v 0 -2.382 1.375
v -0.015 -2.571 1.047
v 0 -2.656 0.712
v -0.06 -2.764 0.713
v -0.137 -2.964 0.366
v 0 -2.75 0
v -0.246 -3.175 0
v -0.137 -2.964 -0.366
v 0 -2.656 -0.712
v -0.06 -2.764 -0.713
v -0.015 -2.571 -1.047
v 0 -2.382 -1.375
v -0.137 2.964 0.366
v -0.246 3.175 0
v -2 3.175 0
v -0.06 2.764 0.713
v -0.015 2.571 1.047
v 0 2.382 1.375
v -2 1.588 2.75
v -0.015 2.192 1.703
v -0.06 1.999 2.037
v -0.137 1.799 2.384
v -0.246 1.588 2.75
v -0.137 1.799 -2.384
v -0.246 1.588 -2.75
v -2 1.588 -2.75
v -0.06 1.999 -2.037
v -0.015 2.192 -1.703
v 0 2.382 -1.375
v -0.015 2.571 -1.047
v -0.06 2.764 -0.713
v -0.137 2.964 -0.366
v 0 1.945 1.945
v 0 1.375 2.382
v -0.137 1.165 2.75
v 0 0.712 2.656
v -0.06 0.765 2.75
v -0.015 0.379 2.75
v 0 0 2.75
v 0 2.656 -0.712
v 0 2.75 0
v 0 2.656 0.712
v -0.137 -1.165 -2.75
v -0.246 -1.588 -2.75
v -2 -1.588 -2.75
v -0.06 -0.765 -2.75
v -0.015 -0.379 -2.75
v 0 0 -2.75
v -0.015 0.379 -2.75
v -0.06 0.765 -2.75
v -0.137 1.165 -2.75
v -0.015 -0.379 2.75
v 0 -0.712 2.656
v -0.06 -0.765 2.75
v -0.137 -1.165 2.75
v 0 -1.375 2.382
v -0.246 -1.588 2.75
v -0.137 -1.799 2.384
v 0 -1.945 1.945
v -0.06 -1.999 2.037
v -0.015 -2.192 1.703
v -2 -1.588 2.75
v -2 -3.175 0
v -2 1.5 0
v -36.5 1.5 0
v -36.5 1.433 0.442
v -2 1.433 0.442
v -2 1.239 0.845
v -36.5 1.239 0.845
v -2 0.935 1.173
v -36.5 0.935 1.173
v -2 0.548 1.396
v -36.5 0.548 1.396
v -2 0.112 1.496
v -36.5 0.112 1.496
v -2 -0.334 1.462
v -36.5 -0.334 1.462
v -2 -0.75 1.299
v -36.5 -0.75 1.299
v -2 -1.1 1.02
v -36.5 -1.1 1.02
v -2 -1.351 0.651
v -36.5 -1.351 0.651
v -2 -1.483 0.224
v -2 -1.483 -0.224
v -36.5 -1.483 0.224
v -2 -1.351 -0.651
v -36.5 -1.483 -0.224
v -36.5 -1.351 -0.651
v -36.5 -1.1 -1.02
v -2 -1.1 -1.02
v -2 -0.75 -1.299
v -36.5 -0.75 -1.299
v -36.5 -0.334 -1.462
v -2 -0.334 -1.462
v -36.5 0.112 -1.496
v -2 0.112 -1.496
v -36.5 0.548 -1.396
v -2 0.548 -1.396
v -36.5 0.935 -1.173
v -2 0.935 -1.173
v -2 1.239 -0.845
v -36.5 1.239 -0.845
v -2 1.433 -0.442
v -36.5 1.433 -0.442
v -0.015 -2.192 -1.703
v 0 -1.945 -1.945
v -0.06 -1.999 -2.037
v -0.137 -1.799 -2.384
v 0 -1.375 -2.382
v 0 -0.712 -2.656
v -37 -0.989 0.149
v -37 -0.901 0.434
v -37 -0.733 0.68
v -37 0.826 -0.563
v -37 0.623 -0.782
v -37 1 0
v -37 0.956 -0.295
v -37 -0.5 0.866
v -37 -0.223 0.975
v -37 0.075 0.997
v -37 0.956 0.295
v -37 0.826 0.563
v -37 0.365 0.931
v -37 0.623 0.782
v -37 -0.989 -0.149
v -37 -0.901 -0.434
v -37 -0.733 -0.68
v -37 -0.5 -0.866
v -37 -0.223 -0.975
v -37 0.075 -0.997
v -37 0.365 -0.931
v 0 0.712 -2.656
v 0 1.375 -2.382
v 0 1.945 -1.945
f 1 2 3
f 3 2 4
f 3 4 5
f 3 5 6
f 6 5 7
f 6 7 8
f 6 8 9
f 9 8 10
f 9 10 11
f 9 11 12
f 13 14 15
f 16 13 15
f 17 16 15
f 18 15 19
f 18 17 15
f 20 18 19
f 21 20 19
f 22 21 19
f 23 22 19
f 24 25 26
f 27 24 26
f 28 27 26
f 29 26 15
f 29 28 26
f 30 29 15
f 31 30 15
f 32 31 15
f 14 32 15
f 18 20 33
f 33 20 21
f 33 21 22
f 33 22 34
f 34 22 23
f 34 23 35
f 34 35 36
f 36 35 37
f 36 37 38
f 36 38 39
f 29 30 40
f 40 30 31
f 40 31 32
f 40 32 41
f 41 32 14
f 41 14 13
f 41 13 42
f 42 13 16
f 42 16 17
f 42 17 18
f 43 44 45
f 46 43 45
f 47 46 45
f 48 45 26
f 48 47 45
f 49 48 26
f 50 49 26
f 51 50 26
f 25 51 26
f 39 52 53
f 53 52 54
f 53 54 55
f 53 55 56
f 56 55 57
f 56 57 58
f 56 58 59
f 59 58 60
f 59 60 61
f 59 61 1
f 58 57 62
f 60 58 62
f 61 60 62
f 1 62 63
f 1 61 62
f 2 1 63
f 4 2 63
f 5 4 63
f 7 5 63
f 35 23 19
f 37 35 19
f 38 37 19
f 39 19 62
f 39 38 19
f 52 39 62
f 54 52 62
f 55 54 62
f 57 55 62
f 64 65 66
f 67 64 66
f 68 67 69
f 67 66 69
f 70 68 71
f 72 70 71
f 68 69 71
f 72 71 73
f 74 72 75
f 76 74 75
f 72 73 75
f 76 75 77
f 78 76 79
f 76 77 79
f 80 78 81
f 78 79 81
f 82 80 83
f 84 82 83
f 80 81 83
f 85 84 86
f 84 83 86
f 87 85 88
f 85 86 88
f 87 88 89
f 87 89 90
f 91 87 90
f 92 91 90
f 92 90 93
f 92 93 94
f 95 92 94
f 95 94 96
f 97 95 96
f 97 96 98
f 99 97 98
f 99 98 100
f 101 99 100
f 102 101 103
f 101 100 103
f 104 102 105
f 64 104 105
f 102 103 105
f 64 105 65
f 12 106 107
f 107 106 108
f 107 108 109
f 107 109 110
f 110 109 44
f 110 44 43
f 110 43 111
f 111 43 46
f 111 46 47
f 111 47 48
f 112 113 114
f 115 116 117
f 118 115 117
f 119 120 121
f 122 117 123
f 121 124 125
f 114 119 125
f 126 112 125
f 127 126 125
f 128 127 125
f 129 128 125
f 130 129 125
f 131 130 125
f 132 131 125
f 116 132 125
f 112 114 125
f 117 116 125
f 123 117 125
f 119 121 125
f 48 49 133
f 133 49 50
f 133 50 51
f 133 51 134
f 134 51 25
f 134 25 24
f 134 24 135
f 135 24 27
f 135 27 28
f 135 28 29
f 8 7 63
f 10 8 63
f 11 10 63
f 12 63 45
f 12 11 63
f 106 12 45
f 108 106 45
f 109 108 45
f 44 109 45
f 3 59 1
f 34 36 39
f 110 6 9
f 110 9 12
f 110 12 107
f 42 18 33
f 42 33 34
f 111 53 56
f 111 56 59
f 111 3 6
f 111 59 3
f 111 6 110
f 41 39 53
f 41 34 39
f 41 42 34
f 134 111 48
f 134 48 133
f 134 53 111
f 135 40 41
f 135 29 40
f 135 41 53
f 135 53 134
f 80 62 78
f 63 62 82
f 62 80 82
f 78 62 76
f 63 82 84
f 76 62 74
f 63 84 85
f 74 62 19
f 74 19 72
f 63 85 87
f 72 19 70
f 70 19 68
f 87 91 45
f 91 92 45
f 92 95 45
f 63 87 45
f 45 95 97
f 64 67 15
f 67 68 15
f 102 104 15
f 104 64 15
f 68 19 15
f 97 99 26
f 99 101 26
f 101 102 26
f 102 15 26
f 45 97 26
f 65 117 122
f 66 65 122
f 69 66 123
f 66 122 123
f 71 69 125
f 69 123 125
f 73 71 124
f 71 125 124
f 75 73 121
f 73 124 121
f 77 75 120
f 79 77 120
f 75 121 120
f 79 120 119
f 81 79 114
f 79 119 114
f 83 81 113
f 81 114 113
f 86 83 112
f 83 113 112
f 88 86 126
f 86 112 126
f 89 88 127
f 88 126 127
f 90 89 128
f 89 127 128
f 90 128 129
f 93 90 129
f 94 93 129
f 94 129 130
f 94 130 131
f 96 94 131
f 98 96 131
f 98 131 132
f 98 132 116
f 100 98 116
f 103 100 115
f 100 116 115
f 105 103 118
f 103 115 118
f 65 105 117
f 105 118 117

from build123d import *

# Parameters (mm, degrees)
DODANIE_WYCI_GNI_CIE1_DEPTH = 2
SFAZOWANIE1_SIZE            = 0.5


with BuildPart() as part:
    # Szkic1 → Obrót1 (revolve)
    with BuildSketch(Plane.XY):
        Polygon((0, 0), (0, 2.75), (-2, 2.75), (-2, 1.5), (-37, 1.5), (-37, 0), align=None)
    revolve(axis=Axis((-37, 0, 0), (1, 0, 0)))

    # Szkic2 → Dodanie-wyciągnięcie1 (add)
    with BuildSketch(Plane(origin=(0, 0, 0), x_dir=(0, 0, -1), z_dir=(1, 0, 0))):
        Polygon((-2.75, 1.58771324), (-2.75, -1.58771324), (0, -3.175426481), (2.75, -1.58771324), (2.75, 1.58771324), (0, 3.175426481), align=None)
    extrude(amount=-DODANIE_WYCI_GNI_CIE1_DEPTH)

    # Sfazowanie1
    sfazowanie1_edges = [part.edges().sort_by_distance(p)[0] for p in [
        (-37, -1.5, 0),
    ]]
    chamfer(sfazowanie1_edges, length=SFAZOWANIE1_SIZE)

    # Szkic9 → Wycięcie-obrót1 (revolve, cut)
    with BuildSketch(Plane.XY):
        Polygon((0, 3.175426481), (0, 2.75), (-0.245620093, 3.175426481), align=None)
    revolve(axis=Axis((-37, 0, 0), (1, 0, 0)), mode=Mode.SUBTRACT)


solid = part.part
